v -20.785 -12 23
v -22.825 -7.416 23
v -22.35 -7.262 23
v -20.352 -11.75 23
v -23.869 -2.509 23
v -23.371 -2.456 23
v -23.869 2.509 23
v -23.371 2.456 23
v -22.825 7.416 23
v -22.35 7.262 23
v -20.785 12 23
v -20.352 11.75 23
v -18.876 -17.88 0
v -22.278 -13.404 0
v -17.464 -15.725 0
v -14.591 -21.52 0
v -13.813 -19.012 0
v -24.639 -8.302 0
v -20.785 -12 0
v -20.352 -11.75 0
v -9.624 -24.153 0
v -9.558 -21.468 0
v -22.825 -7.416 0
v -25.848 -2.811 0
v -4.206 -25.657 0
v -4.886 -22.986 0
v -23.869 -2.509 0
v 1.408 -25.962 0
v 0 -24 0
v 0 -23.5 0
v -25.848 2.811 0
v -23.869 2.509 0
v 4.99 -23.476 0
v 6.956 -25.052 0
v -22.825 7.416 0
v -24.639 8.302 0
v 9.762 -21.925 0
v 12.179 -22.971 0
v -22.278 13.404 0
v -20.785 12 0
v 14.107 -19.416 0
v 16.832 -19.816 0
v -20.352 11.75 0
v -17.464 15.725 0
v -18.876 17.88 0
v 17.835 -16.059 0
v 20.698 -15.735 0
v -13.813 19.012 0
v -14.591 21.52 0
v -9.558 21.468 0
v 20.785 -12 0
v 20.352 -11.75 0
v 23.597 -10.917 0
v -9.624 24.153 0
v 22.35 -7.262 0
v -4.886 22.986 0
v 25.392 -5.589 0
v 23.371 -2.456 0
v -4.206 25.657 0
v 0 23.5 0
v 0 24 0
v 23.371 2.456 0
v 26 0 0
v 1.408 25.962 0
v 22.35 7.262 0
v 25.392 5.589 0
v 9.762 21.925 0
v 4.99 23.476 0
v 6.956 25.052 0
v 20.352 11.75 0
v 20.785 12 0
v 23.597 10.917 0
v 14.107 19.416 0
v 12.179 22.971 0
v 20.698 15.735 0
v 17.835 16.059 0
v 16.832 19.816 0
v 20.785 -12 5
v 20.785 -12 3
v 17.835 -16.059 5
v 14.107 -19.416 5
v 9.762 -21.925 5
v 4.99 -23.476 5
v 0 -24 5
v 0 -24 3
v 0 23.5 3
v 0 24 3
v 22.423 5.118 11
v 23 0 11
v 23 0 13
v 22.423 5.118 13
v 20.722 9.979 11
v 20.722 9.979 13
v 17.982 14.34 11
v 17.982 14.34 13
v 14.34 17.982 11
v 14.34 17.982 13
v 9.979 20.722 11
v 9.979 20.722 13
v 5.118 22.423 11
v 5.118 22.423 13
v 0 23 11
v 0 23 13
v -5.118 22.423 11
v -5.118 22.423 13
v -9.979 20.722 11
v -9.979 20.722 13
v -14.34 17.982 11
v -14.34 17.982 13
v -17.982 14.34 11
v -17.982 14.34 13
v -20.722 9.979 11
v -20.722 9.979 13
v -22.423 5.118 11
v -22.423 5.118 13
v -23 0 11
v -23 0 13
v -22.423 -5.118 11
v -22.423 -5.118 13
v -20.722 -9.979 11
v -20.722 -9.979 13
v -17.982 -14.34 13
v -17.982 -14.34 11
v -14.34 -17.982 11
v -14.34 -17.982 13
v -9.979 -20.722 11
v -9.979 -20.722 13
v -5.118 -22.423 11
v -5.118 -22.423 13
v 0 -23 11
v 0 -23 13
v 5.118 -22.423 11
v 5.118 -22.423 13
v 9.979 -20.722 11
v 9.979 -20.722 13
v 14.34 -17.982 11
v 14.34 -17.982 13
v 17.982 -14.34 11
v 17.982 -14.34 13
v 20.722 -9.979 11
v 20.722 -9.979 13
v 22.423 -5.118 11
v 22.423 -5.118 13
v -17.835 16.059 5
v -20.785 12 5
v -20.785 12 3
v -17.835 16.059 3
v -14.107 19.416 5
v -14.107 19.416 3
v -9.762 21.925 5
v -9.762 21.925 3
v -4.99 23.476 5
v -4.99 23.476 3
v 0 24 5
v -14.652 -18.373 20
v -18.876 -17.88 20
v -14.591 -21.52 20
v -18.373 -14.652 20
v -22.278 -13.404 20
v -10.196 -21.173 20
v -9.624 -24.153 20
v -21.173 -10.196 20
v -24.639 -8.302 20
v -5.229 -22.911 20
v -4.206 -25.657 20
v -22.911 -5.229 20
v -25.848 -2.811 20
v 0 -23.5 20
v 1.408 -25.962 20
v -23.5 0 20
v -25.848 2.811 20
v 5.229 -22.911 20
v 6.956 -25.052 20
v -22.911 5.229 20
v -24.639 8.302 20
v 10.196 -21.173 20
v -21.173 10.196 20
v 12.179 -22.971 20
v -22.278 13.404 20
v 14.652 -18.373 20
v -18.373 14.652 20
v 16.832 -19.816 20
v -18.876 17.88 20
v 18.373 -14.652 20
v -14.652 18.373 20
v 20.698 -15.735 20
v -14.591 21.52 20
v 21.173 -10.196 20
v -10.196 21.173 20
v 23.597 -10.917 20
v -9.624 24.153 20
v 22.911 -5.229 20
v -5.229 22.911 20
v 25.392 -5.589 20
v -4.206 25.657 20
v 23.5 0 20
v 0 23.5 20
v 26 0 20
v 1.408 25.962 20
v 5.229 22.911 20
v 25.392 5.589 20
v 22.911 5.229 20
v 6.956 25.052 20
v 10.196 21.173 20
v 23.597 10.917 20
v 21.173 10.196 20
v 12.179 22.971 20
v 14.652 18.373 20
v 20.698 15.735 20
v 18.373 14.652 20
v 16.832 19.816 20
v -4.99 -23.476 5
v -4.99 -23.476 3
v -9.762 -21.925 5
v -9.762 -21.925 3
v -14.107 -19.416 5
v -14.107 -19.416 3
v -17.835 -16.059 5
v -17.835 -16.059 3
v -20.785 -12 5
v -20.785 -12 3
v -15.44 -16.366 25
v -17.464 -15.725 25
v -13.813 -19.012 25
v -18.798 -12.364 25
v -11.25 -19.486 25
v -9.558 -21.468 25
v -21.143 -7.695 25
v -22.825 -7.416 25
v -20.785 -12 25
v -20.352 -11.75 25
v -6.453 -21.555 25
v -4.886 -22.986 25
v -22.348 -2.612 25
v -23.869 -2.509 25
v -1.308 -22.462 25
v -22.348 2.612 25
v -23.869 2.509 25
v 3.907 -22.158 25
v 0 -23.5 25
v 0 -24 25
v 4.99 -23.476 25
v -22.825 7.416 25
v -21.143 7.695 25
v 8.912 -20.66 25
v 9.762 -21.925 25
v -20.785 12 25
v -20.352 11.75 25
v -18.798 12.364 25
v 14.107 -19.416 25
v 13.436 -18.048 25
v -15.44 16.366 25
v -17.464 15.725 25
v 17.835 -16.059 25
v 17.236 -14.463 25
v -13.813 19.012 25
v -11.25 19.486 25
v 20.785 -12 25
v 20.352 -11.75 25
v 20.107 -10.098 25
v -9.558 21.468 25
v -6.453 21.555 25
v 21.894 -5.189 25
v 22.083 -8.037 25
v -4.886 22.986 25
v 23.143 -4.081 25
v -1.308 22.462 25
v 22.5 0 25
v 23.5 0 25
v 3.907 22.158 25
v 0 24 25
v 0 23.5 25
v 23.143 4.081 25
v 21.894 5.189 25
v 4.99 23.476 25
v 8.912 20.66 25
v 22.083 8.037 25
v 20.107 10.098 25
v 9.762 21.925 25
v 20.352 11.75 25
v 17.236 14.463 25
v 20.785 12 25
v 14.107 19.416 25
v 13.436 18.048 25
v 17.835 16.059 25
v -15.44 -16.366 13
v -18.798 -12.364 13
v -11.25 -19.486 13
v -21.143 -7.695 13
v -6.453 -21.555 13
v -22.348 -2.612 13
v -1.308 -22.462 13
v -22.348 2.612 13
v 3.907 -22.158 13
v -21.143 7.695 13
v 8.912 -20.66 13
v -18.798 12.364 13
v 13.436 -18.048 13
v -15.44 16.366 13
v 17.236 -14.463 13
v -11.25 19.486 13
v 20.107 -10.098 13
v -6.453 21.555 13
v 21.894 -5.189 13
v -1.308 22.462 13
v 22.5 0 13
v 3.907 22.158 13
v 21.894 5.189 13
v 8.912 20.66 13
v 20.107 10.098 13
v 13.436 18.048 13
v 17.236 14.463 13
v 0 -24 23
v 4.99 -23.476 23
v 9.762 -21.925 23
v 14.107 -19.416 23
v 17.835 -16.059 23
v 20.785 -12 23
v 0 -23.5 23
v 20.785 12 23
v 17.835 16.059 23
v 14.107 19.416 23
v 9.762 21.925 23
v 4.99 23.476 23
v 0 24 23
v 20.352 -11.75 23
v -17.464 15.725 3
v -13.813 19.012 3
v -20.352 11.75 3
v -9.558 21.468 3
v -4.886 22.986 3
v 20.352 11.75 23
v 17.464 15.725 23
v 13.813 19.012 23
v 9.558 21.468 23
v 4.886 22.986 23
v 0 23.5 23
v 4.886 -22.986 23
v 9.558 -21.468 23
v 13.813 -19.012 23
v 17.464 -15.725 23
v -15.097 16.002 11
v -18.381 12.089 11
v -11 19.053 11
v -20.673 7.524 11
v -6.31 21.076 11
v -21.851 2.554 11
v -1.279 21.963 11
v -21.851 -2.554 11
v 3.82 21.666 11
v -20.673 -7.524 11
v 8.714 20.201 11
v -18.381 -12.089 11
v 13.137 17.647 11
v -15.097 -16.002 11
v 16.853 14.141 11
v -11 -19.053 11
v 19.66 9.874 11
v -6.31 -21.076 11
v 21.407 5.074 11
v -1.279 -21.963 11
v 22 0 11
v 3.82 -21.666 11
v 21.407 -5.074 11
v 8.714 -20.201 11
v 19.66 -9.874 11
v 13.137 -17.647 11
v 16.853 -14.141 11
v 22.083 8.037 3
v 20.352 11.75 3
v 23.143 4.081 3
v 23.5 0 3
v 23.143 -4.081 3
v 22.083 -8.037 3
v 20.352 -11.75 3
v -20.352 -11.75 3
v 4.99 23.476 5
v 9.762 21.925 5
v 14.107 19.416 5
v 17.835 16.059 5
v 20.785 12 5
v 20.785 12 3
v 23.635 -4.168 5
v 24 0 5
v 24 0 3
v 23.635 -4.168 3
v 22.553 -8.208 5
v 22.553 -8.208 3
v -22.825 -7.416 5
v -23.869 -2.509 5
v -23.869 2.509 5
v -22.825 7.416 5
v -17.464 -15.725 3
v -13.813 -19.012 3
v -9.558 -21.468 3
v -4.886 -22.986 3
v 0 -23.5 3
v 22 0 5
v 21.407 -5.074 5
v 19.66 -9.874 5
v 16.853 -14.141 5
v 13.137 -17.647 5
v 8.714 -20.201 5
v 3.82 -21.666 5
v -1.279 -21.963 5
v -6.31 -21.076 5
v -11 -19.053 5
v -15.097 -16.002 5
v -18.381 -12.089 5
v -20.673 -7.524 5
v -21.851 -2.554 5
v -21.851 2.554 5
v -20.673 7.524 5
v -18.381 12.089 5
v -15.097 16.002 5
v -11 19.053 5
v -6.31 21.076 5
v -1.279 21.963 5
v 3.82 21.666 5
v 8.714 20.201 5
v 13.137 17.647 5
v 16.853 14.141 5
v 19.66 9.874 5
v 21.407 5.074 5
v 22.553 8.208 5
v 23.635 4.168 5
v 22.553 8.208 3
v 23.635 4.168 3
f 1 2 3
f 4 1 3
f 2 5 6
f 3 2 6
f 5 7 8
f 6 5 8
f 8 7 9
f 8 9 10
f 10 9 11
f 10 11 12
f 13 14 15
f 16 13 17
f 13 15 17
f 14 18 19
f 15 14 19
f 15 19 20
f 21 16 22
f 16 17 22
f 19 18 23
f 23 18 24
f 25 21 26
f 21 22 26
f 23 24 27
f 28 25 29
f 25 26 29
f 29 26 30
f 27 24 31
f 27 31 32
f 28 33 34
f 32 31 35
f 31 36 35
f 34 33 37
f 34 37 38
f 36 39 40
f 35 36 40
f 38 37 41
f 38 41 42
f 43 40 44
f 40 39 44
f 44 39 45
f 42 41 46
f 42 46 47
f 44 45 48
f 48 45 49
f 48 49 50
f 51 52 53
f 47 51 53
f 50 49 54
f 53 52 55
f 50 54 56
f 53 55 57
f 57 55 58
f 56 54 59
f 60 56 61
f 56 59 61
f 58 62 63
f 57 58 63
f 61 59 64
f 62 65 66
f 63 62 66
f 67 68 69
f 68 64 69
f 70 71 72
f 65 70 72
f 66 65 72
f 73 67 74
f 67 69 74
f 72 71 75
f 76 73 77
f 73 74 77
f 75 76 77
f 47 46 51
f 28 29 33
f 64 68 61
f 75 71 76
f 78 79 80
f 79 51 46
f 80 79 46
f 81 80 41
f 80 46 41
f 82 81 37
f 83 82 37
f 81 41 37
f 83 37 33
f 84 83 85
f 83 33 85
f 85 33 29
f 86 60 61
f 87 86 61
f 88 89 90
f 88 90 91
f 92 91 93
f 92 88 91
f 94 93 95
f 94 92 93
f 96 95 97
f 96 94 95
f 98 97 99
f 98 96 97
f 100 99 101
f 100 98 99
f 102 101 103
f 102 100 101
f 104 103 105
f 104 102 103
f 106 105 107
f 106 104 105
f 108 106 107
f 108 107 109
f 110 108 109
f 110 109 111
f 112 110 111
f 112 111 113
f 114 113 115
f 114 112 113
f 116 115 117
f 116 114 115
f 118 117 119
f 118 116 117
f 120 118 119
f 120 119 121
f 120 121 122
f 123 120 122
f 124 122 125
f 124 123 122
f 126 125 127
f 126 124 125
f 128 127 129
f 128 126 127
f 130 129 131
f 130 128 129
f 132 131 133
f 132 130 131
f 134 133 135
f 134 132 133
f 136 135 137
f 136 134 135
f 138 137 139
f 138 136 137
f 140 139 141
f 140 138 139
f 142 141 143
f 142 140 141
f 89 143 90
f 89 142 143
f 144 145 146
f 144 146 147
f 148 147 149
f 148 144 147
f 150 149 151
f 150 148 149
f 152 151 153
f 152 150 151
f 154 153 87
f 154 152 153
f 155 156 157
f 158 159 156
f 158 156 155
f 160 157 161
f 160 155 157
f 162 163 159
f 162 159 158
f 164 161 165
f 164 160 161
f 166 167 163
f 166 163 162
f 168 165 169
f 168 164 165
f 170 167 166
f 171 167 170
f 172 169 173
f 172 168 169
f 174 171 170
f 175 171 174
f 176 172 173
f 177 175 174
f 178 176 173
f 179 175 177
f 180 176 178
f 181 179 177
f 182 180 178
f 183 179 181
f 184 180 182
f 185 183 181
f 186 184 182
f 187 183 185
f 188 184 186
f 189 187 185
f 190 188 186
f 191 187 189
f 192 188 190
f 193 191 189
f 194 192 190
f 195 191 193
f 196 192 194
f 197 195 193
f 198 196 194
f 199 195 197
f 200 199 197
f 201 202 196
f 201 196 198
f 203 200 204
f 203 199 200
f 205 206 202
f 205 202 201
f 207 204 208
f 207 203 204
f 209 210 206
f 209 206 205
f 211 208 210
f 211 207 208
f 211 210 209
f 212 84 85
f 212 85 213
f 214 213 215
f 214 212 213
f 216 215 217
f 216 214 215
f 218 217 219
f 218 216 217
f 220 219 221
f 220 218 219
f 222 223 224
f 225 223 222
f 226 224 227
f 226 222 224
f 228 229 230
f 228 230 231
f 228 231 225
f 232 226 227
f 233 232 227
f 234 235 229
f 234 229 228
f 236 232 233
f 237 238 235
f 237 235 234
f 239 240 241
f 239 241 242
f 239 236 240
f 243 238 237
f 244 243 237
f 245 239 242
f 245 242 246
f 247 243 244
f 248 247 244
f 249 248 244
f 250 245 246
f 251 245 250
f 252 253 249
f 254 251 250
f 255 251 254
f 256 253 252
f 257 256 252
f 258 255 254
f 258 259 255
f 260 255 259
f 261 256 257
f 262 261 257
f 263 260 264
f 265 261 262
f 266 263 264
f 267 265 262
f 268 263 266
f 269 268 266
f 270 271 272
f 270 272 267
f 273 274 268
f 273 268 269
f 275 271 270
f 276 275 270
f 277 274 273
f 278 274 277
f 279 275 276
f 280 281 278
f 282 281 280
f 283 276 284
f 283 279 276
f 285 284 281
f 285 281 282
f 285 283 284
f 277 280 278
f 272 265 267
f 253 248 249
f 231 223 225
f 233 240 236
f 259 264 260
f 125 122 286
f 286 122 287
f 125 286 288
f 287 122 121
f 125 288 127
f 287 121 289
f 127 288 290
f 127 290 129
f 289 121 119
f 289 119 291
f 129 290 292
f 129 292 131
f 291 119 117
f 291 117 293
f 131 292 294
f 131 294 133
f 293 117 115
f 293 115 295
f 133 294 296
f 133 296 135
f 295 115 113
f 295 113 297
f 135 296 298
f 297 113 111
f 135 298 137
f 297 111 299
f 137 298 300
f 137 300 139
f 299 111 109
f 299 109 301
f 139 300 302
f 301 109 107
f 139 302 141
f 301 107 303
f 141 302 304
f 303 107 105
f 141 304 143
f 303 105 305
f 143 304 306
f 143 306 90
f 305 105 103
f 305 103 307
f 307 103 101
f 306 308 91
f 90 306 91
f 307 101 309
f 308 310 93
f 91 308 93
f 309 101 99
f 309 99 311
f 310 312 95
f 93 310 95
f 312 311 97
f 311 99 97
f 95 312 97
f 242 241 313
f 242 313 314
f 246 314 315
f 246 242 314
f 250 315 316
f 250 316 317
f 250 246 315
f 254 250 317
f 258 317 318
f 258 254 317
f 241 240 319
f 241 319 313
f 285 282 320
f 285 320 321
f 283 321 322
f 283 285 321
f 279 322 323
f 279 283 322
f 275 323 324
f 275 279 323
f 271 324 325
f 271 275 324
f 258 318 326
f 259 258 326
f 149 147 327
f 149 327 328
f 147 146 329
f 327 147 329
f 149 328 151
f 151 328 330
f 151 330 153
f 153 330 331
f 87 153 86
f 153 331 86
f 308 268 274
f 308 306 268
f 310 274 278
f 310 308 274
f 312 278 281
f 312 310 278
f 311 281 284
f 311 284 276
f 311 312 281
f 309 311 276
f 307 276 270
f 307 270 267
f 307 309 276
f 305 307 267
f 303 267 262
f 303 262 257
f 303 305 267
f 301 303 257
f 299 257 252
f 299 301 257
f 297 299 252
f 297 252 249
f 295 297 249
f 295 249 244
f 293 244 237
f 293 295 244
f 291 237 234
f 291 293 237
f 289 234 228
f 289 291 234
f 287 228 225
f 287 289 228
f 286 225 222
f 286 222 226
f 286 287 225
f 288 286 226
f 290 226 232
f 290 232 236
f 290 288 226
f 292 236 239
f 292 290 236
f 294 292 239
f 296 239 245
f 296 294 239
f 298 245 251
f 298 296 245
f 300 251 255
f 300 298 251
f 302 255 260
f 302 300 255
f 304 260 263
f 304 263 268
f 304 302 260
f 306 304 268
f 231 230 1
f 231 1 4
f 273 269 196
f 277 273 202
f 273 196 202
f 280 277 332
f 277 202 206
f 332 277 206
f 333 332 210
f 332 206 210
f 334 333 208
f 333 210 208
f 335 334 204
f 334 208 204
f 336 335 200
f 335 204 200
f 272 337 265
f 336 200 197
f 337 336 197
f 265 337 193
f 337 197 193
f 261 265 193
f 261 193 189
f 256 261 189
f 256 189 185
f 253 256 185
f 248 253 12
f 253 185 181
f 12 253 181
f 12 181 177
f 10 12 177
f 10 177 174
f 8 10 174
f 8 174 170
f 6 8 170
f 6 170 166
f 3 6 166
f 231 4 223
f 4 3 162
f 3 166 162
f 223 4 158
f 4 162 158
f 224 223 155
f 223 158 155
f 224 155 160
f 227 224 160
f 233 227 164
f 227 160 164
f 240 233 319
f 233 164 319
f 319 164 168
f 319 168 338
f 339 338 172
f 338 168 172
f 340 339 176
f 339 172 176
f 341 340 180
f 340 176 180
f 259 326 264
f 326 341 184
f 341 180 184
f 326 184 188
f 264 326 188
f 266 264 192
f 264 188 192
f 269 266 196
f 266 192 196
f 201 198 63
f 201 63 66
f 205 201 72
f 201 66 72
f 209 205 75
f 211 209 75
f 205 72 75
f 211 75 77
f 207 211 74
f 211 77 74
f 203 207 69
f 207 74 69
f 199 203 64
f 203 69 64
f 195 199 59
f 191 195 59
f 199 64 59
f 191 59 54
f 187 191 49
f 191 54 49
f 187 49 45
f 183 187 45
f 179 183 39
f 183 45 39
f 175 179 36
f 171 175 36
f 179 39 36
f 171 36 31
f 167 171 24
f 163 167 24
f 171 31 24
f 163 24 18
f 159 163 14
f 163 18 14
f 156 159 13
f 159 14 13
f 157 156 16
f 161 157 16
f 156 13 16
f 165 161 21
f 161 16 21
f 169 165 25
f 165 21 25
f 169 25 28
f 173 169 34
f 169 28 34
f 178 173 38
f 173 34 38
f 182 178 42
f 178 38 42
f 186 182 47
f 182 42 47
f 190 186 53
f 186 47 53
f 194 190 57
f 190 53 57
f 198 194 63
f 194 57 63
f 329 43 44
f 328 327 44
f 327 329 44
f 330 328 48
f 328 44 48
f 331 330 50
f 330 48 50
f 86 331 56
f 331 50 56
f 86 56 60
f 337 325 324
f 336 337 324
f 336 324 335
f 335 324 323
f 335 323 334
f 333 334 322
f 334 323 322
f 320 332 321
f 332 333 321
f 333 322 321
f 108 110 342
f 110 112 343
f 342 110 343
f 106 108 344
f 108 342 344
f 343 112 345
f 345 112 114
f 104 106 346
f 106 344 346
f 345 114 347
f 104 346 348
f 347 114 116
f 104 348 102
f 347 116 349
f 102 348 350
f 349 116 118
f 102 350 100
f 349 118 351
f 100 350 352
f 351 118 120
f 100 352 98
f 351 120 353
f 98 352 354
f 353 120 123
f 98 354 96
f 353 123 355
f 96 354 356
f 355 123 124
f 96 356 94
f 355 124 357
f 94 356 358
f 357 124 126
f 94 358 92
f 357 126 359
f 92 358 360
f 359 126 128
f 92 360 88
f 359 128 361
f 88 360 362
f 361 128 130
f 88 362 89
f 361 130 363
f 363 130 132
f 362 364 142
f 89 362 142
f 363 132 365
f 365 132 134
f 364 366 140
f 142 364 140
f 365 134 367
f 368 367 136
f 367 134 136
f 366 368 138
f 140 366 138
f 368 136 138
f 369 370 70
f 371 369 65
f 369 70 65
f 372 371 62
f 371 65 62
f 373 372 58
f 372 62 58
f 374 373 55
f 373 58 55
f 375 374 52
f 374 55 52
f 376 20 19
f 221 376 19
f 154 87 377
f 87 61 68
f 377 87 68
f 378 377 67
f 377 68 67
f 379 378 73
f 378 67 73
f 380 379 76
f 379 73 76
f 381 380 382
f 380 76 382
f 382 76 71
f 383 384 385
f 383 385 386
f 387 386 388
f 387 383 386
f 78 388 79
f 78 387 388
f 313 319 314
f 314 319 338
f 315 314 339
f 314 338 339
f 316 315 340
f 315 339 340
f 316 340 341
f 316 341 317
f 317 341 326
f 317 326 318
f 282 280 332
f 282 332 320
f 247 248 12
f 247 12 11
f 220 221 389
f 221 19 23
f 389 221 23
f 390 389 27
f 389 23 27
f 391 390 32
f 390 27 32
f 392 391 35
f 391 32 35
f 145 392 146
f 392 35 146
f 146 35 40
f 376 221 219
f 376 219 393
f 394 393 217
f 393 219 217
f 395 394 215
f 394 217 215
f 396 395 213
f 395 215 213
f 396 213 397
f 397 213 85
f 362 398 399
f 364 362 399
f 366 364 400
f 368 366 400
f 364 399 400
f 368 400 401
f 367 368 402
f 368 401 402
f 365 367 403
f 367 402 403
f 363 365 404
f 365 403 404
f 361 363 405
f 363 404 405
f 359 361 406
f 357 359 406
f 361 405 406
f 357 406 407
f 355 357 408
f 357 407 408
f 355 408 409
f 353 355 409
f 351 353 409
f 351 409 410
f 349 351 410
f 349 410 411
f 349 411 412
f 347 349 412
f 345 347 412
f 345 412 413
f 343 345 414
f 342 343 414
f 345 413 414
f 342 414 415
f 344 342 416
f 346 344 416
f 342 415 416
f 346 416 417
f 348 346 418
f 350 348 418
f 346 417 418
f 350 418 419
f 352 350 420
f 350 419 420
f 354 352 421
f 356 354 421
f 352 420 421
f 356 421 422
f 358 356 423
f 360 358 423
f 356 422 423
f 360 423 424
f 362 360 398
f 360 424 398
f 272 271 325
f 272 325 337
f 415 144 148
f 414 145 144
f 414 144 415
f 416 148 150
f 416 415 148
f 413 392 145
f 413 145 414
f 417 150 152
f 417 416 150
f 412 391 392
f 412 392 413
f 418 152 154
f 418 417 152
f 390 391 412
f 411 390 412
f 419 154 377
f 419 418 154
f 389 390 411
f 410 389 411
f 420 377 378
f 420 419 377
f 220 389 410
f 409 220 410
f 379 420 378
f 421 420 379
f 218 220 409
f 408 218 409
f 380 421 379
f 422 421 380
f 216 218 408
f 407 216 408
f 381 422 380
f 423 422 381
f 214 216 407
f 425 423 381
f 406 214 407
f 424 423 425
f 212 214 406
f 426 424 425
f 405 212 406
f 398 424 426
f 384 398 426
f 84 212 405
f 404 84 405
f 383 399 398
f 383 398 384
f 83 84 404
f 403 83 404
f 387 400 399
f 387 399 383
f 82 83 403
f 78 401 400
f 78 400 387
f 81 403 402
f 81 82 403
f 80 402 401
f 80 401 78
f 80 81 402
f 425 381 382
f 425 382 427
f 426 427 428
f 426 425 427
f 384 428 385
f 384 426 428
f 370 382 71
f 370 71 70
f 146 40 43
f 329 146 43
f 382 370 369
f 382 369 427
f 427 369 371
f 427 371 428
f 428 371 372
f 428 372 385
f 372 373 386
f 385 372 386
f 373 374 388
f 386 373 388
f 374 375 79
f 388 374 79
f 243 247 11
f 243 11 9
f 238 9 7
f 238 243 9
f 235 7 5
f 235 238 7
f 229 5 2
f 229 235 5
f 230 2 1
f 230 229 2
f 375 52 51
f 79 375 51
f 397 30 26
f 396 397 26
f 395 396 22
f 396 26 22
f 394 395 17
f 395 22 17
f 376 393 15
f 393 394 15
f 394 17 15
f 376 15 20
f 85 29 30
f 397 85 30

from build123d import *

# Parameters (mm, degrees)
F0_R      = 26
F0_R_2    = 22.5
F1_DEPTH  = 20
F2_R      = 23.5
F2_R_2    = 22.5
F3_DEPTH  = 5
F4_R      = 23.5
F4_R_2    = 22.5
F5_DEPTH  = 5
F7_DEPTH  = 2
F9_DEPTH  = 5
F11_DEPTH = 2
F12_R     = 22.5
F12_R_2   = 22
F13_DEPTH = 6
F14_R     = 23
F14_R_2   = 22.5
F15_DEPTH = 2


with BuildPart() as f1:
    # F0 (on Top) → F1 (new body)
    with BuildSketch(Plane.XY):
        Circle(F0_R)
        Circle(F0_R_2, mode=Mode.SUBTRACT)
    extrude(amount=F1_DEPTH)

    # F2 (on face) → F3 (cut)
    with BuildSketch(Plane(origin=(0, 0, 0), x_dir=(1, 0, 0), z_dir=(0, 0, -1))):
        Circle(F2_R)
        Circle(F2_R_2, mode=Mode.SUBTRACT)
    extrude(amount=-F3_DEPTH, mode=Mode.SUBTRACT)

    # F4 (on face) → F5 (join)
    with BuildSketch(Plane.XY.offset(20)):
        Circle(F4_R)
        Circle(F4_R_2, mode=Mode.SUBTRACT)
    extrude(amount=F5_DEPTH)

    # F6 (on face) → F7 (join)
    with BuildSketch(Plane.XY.offset(25)):
        with BuildLine():
            Line((-20.3515969889, 11.75), (-20.7846096908, 12))
            ThreePointArc((-20.7846096908, 12), (-24, 0), (-20.7846096908, -12))
            Line((-20.7846096908, -12), (-20.3515969889, -11.75))
            ThreePointArc((-20.3515969889, -11.75), (-23.5, 0), (-20.3515969889, 11.75))
        make_face()
        with BuildLine():
            Line((20.3515969889, 11.75), (20.7846096908, 12))
            ThreePointArc((20.7846096908, 12), (12, 20.7846096908), (0, 24))
            Line((0, 24), (0, 23.5))
            ThreePointArc((0, 23.5), (11.75, 20.3515969889), (20.3515969889, 11.75))
        make_face()
        with BuildLine():
            ThreePointArc((0, -24), (12, -20.7846096908), (20.7846096908, -12))
            Line((20.7846096908, -12), (20.3515969889, -11.75))
            ThreePointArc((20.3515969889, -11.75), (11.75, -20.3515969889), (0, -23.5))
            Line((0, -23.5), (0, -24))
        make_face()
    extrude(amount=-F7_DEPTH)

    # F8 (on face) → F9 (cut)
    with BuildSketch(Plane(origin=(0, 0, 0), x_dir=(1, 0, 0), z_dir=(0, 0, -1))):
        with BuildLine():
            Line((20.3515969889, 11.75), (20.7846096908, 12))
            ThreePointArc((20.7846096908, 12), (12, 20.7846096908), (0, 24))
            Line((0, 24), (0, 23.5))
            ThreePointArc((0, 23.5), (11.75, 20.3515969889), (20.3515969889, 11.75))
        make_face()
        with BuildLine():
            ThreePointArc((0, -24), (12, -20.7846096908), (20.7846096908, -12))
            Line((20.7846096908, -12), (20.3515969889, -11.75))
            ThreePointArc((20.3515969889, -11.75), (11.75, -20.3515969889), (0, -23.5))
            Line((0, -23.5), (0, -24))
        make_face()
        with BuildLine():
            Line((-20.3515969889, 11.75), (-20.7846096908, 12))
            ThreePointArc((-20.7846096908, 12), (-24, 0), (-20.7846096908, -12))
            Line((-20.7846096908, -12), (-20.3515969889, -11.75))
            ThreePointArc((-20.3515969889, -11.75), (-23.5, 0), (-20.3515969889, 11.75))
        make_face()
    extrude(amount=-F9_DEPTH, mode=Mode.SUBTRACT)

    # F10 (on face) → F11 (cut)
    with BuildSketch(Plane(origin=(0, 0, 5), x_dir=(1, 0, 0), z_dir=(0, 0, -1))):
        with BuildLine():
            ThreePointArc((20.3515969889, 11.75), (22.6992569178, 6.0822475599), (23.5, 0))
            ThreePointArc((23.5, 0), (22.6992569178, -6.0822475599), (20.3515969889, -11.75))
            Line((20.3515969889, -11.75), (20.7846096908, -12))
            ThreePointArc((20.7846096908, -12), (23.1822198309, -6.2116570825), (24, 0))
            ThreePointArc((24, 0), (23.1822198309, 6.2116570825), (20.7846096908, 12))
            Line((20.7846096908, 12), (20.3515969889, 11.75))
        make_face()
        with BuildLine():
            Line((0, -24), (0, -23.5))
            ThreePointArc((0, -23.5), (-11.75, -20.3515969889), (-20.3515969889, -11.75))
            Line((-20.3515969889, -11.75), (-20.7846096908, -12))
            ThreePointArc((-20.7846096908, -12), (-12, -20.7846096908), (0, -24))
        make_face()
        with BuildLine():
            ThreePointArc((-20.3515969889, 11.75), (-11.75, 20.3515969889), (0, 23.5))
            Line((0, 23.5), (0, 24))
            ThreePointArc((0, 24), (-12, 20.7846096908), (-20.7846096908, 12))
            Line((-20.7846096908, 12), (-20.3515969889, 11.75))
        make_face()
    extrude(amount=F11_DEPTH, mode=Mode.SUBTRACT)

    # F12 (on face) → F13 (join)
    with BuildSketch(Plane(origin=(0, 0, 5), x_dir=(1, 0, 0), z_dir=(0, 0, -1))):
        Circle(F12_R)
        Circle(F12_R_2, mode=Mode.SUBTRACT)
    extrude(amount=-F13_DEPTH)

    # F14 (on face) → F15 (cut)
    with BuildSketch(Plane.XY.offset(11)):
        Circle(F14_R)
        Circle(F14_R_2, mode=Mode.SUBTRACT)
    extrude(amount=F15_DEPTH, mode=Mode.SUBTRACT)


solid = f1.part
